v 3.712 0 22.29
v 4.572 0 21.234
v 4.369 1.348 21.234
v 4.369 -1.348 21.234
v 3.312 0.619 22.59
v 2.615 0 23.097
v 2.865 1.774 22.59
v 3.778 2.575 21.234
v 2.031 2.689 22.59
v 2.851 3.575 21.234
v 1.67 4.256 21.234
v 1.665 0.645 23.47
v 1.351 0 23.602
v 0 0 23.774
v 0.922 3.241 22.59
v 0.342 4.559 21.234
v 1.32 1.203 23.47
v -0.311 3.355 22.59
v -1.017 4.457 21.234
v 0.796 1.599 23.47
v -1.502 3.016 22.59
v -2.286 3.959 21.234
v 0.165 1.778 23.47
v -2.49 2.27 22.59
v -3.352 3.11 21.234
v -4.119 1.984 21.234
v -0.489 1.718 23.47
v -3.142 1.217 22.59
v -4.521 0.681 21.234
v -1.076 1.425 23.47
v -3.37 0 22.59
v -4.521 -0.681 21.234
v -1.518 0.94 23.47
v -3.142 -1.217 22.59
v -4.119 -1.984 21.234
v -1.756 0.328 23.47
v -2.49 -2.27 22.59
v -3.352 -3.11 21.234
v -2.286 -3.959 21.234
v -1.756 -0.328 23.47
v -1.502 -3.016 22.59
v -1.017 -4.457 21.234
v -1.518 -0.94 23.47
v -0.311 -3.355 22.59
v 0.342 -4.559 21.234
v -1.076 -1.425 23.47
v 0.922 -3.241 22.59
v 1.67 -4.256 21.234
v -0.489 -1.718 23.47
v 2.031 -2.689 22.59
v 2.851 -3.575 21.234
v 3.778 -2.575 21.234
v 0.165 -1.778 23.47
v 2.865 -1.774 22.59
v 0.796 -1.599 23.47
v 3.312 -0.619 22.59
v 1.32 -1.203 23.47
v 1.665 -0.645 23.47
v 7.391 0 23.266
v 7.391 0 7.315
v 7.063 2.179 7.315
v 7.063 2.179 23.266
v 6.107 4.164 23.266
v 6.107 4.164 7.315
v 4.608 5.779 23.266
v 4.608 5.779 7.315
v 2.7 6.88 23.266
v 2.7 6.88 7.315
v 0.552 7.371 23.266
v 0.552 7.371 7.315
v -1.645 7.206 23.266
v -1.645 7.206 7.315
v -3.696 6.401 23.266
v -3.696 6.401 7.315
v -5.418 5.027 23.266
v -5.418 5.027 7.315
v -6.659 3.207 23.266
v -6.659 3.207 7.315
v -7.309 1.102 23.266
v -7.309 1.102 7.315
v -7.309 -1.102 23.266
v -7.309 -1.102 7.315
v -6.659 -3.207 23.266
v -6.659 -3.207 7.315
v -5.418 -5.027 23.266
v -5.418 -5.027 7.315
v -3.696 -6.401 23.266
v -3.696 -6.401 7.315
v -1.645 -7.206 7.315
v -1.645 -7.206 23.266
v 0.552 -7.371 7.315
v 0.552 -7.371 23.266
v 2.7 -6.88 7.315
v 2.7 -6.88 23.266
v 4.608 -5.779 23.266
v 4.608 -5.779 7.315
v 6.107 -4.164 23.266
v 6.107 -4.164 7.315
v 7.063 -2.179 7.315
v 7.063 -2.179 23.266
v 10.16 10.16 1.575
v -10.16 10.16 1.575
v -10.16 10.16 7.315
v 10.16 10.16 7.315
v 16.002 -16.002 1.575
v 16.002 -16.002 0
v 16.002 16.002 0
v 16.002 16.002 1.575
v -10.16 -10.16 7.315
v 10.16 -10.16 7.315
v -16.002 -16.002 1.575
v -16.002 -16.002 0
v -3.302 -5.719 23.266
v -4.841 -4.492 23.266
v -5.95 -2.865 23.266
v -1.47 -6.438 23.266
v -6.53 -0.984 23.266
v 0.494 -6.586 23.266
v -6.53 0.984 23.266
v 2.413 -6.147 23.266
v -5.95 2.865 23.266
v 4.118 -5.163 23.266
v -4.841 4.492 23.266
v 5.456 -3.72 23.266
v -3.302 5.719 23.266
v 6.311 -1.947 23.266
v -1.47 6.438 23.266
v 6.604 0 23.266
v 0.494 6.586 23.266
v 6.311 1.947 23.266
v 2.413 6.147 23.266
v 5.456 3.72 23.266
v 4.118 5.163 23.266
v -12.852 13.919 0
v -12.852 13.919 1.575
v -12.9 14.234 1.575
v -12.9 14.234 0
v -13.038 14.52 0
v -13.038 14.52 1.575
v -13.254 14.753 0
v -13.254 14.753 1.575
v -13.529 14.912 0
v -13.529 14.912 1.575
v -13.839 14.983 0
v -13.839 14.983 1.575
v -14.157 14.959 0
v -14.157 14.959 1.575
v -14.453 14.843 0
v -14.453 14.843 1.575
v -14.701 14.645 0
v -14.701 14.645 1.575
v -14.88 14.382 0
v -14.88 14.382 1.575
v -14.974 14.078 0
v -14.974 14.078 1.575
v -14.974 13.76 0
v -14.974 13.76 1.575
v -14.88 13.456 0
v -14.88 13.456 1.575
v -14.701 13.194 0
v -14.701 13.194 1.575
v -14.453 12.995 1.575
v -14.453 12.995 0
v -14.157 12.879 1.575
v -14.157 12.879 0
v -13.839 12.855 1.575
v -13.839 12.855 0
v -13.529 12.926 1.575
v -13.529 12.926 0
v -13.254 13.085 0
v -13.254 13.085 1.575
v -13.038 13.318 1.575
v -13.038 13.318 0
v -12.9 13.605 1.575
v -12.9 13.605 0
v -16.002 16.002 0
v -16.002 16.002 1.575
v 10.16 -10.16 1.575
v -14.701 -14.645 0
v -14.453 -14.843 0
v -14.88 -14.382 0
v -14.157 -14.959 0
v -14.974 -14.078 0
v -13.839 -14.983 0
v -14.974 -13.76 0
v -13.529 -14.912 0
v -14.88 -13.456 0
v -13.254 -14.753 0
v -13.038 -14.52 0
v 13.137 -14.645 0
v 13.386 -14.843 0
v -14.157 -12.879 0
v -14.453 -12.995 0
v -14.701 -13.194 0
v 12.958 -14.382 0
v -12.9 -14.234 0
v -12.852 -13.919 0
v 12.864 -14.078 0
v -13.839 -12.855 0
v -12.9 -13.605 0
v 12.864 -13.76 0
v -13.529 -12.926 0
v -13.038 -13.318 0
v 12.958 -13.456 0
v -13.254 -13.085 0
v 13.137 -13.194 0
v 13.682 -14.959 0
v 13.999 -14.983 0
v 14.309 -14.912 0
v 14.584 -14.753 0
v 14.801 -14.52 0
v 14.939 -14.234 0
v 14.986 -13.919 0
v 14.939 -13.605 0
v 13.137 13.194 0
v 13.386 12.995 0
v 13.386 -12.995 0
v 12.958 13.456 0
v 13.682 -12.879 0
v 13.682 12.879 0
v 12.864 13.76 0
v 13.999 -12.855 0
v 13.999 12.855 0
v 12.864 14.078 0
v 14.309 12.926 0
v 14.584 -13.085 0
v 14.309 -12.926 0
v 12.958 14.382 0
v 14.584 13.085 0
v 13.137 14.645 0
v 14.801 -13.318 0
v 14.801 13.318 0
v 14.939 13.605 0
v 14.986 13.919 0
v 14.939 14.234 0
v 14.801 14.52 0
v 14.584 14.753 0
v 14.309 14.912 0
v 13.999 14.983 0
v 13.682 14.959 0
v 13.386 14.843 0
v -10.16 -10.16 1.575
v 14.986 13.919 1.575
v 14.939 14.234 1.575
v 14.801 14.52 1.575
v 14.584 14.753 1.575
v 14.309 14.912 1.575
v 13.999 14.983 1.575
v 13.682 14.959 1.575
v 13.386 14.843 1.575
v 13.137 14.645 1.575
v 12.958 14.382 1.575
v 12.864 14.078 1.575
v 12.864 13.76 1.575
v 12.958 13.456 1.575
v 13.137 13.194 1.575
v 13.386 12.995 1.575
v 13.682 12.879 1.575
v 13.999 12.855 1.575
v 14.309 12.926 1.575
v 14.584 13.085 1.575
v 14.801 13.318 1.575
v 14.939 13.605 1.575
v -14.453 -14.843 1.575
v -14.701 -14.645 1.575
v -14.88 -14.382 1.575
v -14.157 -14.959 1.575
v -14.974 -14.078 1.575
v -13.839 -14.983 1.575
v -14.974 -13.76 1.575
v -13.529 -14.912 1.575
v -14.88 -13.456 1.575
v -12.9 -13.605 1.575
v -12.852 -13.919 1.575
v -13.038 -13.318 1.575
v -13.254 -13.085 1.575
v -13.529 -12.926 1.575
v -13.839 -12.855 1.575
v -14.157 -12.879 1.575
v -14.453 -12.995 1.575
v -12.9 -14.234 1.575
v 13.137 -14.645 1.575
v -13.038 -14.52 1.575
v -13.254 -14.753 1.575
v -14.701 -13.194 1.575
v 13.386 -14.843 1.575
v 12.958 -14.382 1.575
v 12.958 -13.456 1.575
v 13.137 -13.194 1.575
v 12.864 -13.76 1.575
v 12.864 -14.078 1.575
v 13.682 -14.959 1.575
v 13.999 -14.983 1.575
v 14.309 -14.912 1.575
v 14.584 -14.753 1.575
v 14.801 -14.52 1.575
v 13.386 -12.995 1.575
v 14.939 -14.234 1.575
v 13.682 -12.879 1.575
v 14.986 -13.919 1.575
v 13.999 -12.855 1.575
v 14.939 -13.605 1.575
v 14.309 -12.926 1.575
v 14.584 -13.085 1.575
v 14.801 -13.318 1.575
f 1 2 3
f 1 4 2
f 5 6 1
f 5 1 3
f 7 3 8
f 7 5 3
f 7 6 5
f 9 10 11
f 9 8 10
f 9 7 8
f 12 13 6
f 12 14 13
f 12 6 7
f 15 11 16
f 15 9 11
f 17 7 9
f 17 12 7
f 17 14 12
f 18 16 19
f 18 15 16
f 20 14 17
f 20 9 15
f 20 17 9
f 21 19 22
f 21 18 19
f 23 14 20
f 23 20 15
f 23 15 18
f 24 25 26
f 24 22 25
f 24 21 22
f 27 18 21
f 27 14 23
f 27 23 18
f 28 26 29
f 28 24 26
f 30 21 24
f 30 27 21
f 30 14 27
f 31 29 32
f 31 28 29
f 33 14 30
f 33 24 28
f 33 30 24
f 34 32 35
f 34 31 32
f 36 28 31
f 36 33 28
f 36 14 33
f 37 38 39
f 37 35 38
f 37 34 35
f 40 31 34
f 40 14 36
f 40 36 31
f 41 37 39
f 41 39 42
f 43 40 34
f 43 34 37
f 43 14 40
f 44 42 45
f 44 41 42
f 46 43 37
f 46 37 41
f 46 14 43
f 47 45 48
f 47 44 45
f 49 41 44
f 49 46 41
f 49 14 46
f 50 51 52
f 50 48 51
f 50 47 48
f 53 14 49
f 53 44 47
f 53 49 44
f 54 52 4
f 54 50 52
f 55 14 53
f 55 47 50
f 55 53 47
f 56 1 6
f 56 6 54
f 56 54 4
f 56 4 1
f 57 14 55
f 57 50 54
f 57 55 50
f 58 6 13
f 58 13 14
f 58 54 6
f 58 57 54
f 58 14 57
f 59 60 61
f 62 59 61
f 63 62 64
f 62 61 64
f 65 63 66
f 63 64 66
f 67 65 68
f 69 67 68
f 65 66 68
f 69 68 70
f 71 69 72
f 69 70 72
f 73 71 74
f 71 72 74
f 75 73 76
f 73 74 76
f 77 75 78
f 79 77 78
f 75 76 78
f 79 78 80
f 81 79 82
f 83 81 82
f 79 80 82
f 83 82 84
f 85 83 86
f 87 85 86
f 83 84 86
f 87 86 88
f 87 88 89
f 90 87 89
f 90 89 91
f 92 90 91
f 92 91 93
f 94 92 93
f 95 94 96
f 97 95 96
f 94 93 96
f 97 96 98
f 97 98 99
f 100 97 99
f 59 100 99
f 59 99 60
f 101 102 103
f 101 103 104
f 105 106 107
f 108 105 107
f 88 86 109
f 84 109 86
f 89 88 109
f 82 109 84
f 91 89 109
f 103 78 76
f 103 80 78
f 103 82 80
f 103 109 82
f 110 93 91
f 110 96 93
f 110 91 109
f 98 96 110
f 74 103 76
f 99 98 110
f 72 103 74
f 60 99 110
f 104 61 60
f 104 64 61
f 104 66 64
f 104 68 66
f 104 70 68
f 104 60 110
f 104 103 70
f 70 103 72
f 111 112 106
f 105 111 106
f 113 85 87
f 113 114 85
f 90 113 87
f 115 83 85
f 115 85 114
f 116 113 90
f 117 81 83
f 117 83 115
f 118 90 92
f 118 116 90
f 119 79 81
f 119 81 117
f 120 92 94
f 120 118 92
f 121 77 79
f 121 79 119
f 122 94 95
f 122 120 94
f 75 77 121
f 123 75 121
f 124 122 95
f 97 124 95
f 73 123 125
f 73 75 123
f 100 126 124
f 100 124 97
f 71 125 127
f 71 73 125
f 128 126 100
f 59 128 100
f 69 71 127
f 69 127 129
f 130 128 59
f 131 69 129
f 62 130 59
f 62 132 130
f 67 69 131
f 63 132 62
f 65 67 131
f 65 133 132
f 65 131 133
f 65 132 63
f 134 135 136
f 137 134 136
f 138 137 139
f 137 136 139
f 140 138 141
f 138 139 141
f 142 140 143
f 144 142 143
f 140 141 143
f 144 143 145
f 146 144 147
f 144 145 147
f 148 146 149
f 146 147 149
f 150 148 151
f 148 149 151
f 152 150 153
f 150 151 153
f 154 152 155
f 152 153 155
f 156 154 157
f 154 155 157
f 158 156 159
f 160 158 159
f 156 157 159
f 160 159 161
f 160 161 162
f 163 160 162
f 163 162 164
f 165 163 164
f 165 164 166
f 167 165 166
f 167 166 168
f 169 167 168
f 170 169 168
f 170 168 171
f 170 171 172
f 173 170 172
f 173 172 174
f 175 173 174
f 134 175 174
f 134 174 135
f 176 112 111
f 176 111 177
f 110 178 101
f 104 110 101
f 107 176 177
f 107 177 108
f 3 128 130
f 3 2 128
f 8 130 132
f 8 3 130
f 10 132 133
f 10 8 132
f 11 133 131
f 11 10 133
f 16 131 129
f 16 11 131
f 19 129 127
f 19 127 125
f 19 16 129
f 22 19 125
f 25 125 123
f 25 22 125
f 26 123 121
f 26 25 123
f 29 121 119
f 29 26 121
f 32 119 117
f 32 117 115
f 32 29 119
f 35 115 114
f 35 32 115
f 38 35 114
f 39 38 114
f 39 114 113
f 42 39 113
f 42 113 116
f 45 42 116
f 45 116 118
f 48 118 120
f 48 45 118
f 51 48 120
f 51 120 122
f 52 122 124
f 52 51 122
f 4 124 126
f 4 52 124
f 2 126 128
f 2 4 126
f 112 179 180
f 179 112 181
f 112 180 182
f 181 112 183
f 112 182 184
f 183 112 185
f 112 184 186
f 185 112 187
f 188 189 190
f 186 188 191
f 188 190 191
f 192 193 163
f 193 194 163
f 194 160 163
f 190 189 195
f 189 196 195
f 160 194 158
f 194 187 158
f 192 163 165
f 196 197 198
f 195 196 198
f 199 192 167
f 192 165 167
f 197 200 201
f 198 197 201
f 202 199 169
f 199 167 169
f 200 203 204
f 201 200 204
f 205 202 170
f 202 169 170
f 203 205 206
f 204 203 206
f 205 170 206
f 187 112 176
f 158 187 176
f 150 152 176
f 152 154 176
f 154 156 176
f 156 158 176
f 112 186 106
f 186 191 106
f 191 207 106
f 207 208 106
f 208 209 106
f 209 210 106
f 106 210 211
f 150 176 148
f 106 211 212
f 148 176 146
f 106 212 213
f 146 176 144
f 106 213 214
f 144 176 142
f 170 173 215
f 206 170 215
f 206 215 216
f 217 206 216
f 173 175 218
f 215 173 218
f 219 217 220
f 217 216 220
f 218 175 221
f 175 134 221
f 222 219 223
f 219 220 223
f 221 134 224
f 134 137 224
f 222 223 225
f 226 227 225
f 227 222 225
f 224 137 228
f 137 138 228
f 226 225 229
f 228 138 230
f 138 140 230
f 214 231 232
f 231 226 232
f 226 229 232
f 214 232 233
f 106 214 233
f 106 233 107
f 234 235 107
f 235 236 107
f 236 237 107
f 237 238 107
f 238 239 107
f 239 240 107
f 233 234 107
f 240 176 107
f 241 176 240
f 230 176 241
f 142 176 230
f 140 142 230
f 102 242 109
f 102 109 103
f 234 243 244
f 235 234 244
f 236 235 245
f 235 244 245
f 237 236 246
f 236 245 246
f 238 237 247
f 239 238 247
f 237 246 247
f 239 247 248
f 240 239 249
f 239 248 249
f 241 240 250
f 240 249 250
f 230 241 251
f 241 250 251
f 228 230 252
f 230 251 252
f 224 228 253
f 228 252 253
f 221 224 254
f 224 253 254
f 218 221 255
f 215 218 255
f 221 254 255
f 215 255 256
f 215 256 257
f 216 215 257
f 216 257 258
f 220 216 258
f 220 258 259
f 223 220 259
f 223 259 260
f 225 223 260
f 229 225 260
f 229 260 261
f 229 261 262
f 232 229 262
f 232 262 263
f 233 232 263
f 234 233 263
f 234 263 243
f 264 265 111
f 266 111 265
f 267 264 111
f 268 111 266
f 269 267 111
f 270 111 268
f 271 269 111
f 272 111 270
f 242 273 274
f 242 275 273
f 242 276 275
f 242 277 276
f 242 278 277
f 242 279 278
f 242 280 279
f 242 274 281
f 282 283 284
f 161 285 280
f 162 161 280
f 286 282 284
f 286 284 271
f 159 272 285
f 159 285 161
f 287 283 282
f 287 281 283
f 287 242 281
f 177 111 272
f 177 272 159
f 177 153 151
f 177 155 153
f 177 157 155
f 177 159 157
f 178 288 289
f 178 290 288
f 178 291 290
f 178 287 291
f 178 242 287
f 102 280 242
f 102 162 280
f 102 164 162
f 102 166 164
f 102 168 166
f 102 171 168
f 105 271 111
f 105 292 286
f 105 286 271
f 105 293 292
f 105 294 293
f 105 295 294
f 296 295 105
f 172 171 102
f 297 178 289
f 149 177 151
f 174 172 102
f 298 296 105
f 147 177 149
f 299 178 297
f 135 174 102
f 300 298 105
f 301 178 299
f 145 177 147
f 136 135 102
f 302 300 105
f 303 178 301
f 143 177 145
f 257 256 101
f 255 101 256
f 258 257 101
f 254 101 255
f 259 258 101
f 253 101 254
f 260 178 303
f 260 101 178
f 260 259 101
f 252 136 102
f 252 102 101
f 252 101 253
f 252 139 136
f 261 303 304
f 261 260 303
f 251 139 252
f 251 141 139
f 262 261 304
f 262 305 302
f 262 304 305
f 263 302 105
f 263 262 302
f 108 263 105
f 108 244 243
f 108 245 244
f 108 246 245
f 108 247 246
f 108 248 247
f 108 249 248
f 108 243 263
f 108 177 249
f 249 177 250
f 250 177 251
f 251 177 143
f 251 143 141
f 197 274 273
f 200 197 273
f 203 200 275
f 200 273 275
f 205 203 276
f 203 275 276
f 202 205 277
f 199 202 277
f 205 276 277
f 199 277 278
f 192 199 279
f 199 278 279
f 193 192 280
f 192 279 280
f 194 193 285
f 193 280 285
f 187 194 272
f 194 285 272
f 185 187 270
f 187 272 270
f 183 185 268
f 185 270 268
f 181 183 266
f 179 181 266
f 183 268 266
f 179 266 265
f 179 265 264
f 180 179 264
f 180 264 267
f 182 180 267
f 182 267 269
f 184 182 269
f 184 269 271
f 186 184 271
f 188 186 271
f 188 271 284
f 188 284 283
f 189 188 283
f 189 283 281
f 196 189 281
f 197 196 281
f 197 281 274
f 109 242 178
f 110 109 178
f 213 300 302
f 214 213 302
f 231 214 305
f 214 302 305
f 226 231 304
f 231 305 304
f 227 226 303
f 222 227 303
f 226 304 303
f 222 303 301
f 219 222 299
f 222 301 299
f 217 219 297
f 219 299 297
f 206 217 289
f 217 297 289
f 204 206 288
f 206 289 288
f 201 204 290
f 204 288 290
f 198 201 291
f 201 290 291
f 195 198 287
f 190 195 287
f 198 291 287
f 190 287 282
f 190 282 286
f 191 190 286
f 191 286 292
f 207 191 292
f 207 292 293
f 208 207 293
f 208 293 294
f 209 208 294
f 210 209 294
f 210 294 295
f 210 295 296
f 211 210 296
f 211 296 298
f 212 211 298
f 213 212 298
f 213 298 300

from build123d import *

# Parameters (mm, degrees)
SKETCH1_W           = 32.004
SKETCH1_H           = 32.004
BOSS_EXTRUDE1_DEPTH = 1.5748
SKETCH2_W           = 20.32
SKETCH2_H           = 20.32
BOSS_EXTRUDE2_DEPTH = 5.7404
SKETCH3_R           = 7.3914
BOSS_EXTRUDE3_DEPTH = 15.9512
SKETCH4_R           = 1.0668
CUT_EXTRUDE1_DEPTH  = 15.9512
SKETCH5_R           = 3.81
CUT_EXTRUDE2_DEPTH  = 2.032
CHAMFER1_SIZE       = 2.794
DOME2_FACE_RADIUS   = 4.572
DOME2_HEIGHT        = 2.54


with BuildPart() as part:
    # Sketch1 → Boss-Extrude1 (new body)
    with BuildSketch(Plane.XY):
        Rectangle(SKETCH1_W, SKETCH1_H)
    extrude(amount=BOSS_EXTRUDE1_DEPTH)

    # Sketch2 → Boss-Extrude2 (add)
    with BuildSketch(Plane.XY.offset(1.5748)):
        Rectangle(SKETCH2_W, SKETCH2_H)
    extrude(amount=BOSS_EXTRUDE2_DEPTH)

    # Sketch3 → Boss-Extrude3 (add)
    with BuildSketch(Plane.XY.offset(7.3152)):
        Circle(SKETCH3_R)
    extrude(amount=BOSS_EXTRUDE3_DEPTH)

    # Sketch4 → Cut-Extrude1 (cut)
    with BuildSketch(Plane.XY.offset(1.5748)):
        with Locations((-13.9192, 13.9192)):
            Circle(SKETCH4_R)
        with Locations((-13.9192, -13.9192)):
            Circle(SKETCH4_R)
        with Locations((13.9192, 13.9192)):
            Circle(SKETCH4_R)
        with Locations((13.9192, -13.9192)):
            Circle(SKETCH4_R)
    extrude(amount=-CUT_EXTRUDE1_DEPTH, mode=Mode.SUBTRACT)

    # Sketch5 → Cut-Extrude2 (cut)
    with BuildSketch(Plane.XY.offset(23.2664)):
        Circle(SKETCH5_R)
    extrude(amount=-CUT_EXTRUDE2_DEPTH, mode=Mode.SUBTRACT)

    # Chamfer1
    # the kernel refuses this chamfer: 2.794 mm, written as the material it takes off along each edge
    with BuildSketch(Plane(origin=(0, 0, 23.2664), x_dir=(1, 0, 0), z_dir=(0, -1, 0))) as chamfer1_piece_1_section:
        Polygon((3.81 + CHAMFER1_SIZE, 0), (3.81, -CHAMFER1_SIZE), (3.81, 0), align=None)
    chamfer1_piece_1 = revolve(axis=Axis((0, 0, 23.2664), (0, 0, 1)), mode=Mode.PRIVATE)
    chamfer1_piece_1 = split(chamfer1_piece_1, bisect_by=Plane(origin=(-5.592803541, 0, 21.2344), z_dir=(0, 0, 1)), keep=Keep.TOP, mode=Mode.PRIVATE)
    add(chamfer1_piece_1, mode=Mode.SUBTRACT)

    # Dome2: a dome of height H over a round flat face of radius A is a cap of a sphere of radius (A * A + H * H) / (2 * H)
    dome2_r = (DOME2_FACE_RADIUS * DOME2_FACE_RADIUS + DOME2_HEIGHT * DOME2_HEIGHT) / (2 * DOME2_HEIGHT)
    dome2_base = Plane((0, 0, 21.2344), z_dir=(0, 0, 1))
    with Locations(dome2_base.offset(DOME2_HEIGHT - dome2_r)):
        dome2_ball = Sphere(dome2_r, mode=Mode.PRIVATE)
    add(split(dome2_ball, bisect_by=dome2_base, keep=Keep.TOP, mode=Mode.PRIVATE))


solid = part.part
